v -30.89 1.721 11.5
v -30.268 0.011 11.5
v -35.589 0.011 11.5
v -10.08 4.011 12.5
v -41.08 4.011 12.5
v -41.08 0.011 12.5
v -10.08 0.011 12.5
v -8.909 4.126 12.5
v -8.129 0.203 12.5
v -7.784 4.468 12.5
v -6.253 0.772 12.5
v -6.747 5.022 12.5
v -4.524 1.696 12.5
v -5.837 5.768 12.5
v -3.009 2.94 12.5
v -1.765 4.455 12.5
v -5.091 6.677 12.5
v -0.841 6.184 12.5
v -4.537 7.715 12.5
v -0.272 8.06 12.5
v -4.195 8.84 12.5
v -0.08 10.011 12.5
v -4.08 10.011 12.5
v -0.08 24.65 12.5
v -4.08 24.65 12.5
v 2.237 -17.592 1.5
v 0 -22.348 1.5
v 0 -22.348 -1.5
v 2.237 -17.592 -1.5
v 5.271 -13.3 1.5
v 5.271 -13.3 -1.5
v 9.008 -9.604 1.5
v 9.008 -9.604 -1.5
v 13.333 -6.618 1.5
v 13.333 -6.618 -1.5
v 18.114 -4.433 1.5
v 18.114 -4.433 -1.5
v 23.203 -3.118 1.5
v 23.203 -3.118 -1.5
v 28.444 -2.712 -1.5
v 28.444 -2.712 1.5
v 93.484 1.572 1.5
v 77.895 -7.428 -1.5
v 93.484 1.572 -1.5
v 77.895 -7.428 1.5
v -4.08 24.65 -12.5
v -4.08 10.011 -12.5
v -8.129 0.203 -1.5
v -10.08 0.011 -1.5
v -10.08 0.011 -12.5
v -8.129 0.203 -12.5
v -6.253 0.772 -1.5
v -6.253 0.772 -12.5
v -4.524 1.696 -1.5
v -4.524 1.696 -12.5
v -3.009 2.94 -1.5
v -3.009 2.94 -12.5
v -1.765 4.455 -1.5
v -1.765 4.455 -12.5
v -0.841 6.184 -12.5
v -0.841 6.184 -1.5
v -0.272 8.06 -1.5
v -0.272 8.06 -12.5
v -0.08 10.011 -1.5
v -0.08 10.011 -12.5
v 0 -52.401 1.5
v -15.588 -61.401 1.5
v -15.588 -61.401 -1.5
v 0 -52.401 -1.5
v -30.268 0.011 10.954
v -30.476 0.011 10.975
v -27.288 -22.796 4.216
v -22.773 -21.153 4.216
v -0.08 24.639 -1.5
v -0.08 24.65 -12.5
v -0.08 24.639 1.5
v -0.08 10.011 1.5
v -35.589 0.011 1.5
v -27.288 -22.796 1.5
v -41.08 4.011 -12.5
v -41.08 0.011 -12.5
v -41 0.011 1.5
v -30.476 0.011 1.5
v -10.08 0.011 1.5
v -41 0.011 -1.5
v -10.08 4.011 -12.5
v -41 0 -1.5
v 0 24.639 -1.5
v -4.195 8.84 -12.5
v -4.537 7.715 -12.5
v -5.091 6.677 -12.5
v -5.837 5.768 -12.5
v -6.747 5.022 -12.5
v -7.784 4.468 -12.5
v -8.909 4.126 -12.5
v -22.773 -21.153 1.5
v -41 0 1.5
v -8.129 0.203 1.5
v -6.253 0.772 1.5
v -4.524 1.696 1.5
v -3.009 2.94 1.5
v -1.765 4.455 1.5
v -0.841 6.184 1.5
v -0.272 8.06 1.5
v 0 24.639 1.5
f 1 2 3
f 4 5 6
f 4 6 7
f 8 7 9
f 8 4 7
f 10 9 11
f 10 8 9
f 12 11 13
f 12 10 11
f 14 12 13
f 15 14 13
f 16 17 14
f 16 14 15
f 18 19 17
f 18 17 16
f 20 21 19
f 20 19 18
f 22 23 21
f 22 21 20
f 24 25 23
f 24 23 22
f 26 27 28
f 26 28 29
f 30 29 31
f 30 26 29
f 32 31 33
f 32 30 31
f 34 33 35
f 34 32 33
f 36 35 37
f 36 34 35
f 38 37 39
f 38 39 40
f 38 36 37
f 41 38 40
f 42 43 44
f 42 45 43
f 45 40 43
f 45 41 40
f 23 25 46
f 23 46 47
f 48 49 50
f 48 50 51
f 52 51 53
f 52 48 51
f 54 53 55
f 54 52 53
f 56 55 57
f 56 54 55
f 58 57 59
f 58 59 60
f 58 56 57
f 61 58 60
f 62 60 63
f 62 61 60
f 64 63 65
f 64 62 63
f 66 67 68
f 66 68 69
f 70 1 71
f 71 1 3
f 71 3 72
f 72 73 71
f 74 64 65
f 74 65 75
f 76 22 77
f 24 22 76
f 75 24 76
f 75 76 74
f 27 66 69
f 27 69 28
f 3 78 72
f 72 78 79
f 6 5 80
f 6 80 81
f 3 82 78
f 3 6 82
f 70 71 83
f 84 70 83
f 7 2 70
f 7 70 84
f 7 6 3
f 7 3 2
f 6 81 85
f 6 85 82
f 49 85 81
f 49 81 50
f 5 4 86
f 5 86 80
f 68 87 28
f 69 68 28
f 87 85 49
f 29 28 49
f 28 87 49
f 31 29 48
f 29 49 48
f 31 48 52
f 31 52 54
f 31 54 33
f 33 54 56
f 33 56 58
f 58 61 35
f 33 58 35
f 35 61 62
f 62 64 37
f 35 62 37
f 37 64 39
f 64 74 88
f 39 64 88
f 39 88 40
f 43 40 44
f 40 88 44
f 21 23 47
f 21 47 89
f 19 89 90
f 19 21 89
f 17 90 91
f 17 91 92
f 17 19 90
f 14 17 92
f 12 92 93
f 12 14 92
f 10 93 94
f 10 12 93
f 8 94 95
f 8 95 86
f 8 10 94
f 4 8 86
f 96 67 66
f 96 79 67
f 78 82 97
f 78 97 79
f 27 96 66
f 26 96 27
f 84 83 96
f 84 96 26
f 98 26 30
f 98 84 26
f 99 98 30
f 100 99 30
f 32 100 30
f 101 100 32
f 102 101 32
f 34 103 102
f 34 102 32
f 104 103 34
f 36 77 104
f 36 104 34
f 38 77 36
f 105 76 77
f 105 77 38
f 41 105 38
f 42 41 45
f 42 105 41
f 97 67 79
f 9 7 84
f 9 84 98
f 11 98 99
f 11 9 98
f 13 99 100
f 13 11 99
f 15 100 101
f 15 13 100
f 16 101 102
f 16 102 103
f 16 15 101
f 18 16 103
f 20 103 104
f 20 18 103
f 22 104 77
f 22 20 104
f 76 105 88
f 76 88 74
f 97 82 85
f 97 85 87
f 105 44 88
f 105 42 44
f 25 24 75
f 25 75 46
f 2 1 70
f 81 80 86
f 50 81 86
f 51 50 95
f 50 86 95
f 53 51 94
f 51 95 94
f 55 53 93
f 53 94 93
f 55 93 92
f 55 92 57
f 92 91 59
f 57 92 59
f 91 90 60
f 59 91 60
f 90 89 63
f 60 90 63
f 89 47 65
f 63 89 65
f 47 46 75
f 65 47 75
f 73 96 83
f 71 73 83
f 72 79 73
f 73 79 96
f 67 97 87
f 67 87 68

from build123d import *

# Parameters (mm, degrees)
F1_DEPTH = 1.5
F3_DEPTH = 1.5
F5_DEPTH = 12.5
F7_DEPTH = 10
F9_DEPTH = 5


with BuildPart() as f1:
    # F0 (on Top) → F1 (new body, symmetric)
    with BuildSketch(Plane.XY):
        with BuildLine():
            Line((93.483799182, 1.5717417002), (0, 24.639101699))
            Line((0, 24.639101699), (0, 10))
            ThreePointArc((0, 10), (-2.9289321881, 2.9289321881), (-10, 0))
            Line((-10, 0), (-25.5, 0))
            Line((-25.5, 0), (-41, 0))
            Line((-41, 0), (-15.5884572681, -61.4011549224))
            Line((-15.5884572681, -61.4011549224), (0, -52.4011549224))
            Line((0, -52.4011549224), (0, -22.3483927548))
            ThreePointArc((0, -22.3483927548), (11.1050484965, -8.0156356733), (28.4436228876, -2.7124417533))
            Line((28.4436228876, -2.7124417533), (77.8953419139, -7.4282582998))
            Line((77.8953419139, -7.4282582998), (93.483799182, 1.5717417002))
        make_face()
        with BuildLine():
            Line((0, 10), (0, 24.639101699))
            Line((0, 24.639101699), (-4, 24.639101699))
            Line((-4, 24.639101699), (-4, 10))
            ThreePointArc((-4, 10), (-5.7573593129, 5.7573593129), (-10, 4))
            Line((-10, 4), (-41, 4))
            Line((-41, 4), (-41, 0))
            Line((-41, 0), (-25.5, 0))
            Line((-25.5, 0), (-10, 0))
            ThreePointArc((-10, 0), (-2.9289321881, 2.9289321881), (0, 10))
        make_face()
    extrude(amount=F1_DEPTH, both=True)

    # F2 (on Top) → F3 (join, symmetric)
    with BuildSketch(Plane.XY):
        Polygon((-0.4887568886, 8.2661984248), (-11.5621451159, 1.5826697675), (-0.9085235181, -15.3436513582), (9.5235692223, -9.0471873172), align=None)
    extrude(amount=F3_DEPTH, both=True)

    # F4 (on Top) → F5 (join, symmetric)
    with BuildSketch(Plane.XY):
        with BuildLine():
            Line((-0.0799827916, 10.0108882828), (-0.0799827916, 24.6499899817))
            Line((-0.0799827916, 24.6499899817), (-4.0799827916, 24.6499899817))
            Line((-4.0799827916, 24.6499899817), (-4.0799827916, 10.0108882828))
            ThreePointArc((-4.0799827916, 10.0108882828), (-5.8373421045, 5.7682475956), (-10.0799827916, 4.0108882828))
            Line((-10.0799827916, 4.0108882828), (-41.0799827916, 4.0108882828))
            Line((-41.0799827916, 4.0108882828), (-41.0799827916, 0.0108882828))
            Line((-41.0799827916, 0.0108882828), (-10.0799827916, 0.0108882828))
            ThreePointArc((-10.0799827916, 0.0108882828), (-3.0089149798, 2.9398204709), (-0.0799827916, 10.0108882828))
        make_face()
    extrude(amount=F5_DEPTH, both=True)

    # F6 (on face) → F7 (join)
    with BuildSketch(Plane.XY.offset(1.5)):
        Polygon((-35.8013698642, 0.5949702468), (-27.2878240943, -22.7958045155), (-22.773043412, -21.1525587329), (-31.2865891819, 2.2382160294), align=None)
    extrude(amount=F7_DEPTH)

    # F8 (on face) → F9 (cut)
    with BuildSketch(Plane(origin=(-31.422185401, -11.4367401815, 0), x_dir=(0.3420201433, -0.9396926208, 0), z_dir=(-0.9396926208, -0.3420201433, 0))):
        Polygon((-12.1823117593, 11.5), (12.0880637803, 4.2156488635), (12.0880637803, 11.5), align=None)
    extrude(amount=-F9_DEPTH, mode=Mode.SUBTRACT)


solid = f1.part
